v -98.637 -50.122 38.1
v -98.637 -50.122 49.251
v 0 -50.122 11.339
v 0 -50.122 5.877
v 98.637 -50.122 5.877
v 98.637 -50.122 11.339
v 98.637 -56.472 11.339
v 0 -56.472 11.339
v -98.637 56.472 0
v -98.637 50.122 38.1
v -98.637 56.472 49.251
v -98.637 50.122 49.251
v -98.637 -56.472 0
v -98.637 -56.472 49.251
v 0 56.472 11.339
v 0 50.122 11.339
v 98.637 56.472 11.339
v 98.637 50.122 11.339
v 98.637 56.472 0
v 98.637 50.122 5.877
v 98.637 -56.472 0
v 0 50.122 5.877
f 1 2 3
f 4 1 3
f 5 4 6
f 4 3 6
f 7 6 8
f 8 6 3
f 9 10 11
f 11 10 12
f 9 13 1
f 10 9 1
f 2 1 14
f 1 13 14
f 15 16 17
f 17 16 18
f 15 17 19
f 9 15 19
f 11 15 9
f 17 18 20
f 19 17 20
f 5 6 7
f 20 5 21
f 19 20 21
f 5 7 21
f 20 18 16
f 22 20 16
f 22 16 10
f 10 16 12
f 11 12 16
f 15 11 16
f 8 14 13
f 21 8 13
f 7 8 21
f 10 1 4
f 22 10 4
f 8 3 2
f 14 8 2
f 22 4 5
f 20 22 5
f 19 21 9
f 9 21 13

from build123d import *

# Parameters (mm, degrees)
F0_W     = 197.273388
F0_H     = 100.243152
F1_DEPTH = 38.1
F3_DEPTH = 100.244151
F5_DEPTH = 6.35
F7_DEPTH = 6.35


with BuildPart() as f1:
    # F0 (on Top) → F1 (new body)
    with BuildSketch(Plane.XY):
        Rectangle(F0_W, F0_H)
    extrude(amount=F1_DEPTH)

    # F2 (on face) → F3 (cut, through all)
    with BuildSketch(Plane.XZ.offset(50.121576)):
        Polygon((98.636694, 38.1), (-98.636694, 38.1), (0, 5.87702), (98.636694, 5.87702), align=None)
    extrude(amount=-F3_DEPTH, mode=Mode.SUBTRACT)

    # F4 (on face) → F5 (join)
    with BuildSketch(Plane.XZ.offset(50.121576)):
        Polygon((-98.636694, 49.251463), (-98.636694, 0), (98.636694, 0), (98.636694, 11.338987), (0, 11.338987), align=None)
    extrude(amount=F5_DEPTH)

    # F6 (on face) → F7 (join)
    with BuildSketch(Plane(origin=(0, 50.121576, 0), x_dir=(-1, 0, 0), z_dir=(0, 1, 0))):
        Polygon((-98.636694, 0), (98.636694, 0), (98.636694, 49.251463), (0, 11.338987), (-98.636694, 11.338987), align=None)
    extrude(amount=F7_DEPTH)


solid = f1.part
